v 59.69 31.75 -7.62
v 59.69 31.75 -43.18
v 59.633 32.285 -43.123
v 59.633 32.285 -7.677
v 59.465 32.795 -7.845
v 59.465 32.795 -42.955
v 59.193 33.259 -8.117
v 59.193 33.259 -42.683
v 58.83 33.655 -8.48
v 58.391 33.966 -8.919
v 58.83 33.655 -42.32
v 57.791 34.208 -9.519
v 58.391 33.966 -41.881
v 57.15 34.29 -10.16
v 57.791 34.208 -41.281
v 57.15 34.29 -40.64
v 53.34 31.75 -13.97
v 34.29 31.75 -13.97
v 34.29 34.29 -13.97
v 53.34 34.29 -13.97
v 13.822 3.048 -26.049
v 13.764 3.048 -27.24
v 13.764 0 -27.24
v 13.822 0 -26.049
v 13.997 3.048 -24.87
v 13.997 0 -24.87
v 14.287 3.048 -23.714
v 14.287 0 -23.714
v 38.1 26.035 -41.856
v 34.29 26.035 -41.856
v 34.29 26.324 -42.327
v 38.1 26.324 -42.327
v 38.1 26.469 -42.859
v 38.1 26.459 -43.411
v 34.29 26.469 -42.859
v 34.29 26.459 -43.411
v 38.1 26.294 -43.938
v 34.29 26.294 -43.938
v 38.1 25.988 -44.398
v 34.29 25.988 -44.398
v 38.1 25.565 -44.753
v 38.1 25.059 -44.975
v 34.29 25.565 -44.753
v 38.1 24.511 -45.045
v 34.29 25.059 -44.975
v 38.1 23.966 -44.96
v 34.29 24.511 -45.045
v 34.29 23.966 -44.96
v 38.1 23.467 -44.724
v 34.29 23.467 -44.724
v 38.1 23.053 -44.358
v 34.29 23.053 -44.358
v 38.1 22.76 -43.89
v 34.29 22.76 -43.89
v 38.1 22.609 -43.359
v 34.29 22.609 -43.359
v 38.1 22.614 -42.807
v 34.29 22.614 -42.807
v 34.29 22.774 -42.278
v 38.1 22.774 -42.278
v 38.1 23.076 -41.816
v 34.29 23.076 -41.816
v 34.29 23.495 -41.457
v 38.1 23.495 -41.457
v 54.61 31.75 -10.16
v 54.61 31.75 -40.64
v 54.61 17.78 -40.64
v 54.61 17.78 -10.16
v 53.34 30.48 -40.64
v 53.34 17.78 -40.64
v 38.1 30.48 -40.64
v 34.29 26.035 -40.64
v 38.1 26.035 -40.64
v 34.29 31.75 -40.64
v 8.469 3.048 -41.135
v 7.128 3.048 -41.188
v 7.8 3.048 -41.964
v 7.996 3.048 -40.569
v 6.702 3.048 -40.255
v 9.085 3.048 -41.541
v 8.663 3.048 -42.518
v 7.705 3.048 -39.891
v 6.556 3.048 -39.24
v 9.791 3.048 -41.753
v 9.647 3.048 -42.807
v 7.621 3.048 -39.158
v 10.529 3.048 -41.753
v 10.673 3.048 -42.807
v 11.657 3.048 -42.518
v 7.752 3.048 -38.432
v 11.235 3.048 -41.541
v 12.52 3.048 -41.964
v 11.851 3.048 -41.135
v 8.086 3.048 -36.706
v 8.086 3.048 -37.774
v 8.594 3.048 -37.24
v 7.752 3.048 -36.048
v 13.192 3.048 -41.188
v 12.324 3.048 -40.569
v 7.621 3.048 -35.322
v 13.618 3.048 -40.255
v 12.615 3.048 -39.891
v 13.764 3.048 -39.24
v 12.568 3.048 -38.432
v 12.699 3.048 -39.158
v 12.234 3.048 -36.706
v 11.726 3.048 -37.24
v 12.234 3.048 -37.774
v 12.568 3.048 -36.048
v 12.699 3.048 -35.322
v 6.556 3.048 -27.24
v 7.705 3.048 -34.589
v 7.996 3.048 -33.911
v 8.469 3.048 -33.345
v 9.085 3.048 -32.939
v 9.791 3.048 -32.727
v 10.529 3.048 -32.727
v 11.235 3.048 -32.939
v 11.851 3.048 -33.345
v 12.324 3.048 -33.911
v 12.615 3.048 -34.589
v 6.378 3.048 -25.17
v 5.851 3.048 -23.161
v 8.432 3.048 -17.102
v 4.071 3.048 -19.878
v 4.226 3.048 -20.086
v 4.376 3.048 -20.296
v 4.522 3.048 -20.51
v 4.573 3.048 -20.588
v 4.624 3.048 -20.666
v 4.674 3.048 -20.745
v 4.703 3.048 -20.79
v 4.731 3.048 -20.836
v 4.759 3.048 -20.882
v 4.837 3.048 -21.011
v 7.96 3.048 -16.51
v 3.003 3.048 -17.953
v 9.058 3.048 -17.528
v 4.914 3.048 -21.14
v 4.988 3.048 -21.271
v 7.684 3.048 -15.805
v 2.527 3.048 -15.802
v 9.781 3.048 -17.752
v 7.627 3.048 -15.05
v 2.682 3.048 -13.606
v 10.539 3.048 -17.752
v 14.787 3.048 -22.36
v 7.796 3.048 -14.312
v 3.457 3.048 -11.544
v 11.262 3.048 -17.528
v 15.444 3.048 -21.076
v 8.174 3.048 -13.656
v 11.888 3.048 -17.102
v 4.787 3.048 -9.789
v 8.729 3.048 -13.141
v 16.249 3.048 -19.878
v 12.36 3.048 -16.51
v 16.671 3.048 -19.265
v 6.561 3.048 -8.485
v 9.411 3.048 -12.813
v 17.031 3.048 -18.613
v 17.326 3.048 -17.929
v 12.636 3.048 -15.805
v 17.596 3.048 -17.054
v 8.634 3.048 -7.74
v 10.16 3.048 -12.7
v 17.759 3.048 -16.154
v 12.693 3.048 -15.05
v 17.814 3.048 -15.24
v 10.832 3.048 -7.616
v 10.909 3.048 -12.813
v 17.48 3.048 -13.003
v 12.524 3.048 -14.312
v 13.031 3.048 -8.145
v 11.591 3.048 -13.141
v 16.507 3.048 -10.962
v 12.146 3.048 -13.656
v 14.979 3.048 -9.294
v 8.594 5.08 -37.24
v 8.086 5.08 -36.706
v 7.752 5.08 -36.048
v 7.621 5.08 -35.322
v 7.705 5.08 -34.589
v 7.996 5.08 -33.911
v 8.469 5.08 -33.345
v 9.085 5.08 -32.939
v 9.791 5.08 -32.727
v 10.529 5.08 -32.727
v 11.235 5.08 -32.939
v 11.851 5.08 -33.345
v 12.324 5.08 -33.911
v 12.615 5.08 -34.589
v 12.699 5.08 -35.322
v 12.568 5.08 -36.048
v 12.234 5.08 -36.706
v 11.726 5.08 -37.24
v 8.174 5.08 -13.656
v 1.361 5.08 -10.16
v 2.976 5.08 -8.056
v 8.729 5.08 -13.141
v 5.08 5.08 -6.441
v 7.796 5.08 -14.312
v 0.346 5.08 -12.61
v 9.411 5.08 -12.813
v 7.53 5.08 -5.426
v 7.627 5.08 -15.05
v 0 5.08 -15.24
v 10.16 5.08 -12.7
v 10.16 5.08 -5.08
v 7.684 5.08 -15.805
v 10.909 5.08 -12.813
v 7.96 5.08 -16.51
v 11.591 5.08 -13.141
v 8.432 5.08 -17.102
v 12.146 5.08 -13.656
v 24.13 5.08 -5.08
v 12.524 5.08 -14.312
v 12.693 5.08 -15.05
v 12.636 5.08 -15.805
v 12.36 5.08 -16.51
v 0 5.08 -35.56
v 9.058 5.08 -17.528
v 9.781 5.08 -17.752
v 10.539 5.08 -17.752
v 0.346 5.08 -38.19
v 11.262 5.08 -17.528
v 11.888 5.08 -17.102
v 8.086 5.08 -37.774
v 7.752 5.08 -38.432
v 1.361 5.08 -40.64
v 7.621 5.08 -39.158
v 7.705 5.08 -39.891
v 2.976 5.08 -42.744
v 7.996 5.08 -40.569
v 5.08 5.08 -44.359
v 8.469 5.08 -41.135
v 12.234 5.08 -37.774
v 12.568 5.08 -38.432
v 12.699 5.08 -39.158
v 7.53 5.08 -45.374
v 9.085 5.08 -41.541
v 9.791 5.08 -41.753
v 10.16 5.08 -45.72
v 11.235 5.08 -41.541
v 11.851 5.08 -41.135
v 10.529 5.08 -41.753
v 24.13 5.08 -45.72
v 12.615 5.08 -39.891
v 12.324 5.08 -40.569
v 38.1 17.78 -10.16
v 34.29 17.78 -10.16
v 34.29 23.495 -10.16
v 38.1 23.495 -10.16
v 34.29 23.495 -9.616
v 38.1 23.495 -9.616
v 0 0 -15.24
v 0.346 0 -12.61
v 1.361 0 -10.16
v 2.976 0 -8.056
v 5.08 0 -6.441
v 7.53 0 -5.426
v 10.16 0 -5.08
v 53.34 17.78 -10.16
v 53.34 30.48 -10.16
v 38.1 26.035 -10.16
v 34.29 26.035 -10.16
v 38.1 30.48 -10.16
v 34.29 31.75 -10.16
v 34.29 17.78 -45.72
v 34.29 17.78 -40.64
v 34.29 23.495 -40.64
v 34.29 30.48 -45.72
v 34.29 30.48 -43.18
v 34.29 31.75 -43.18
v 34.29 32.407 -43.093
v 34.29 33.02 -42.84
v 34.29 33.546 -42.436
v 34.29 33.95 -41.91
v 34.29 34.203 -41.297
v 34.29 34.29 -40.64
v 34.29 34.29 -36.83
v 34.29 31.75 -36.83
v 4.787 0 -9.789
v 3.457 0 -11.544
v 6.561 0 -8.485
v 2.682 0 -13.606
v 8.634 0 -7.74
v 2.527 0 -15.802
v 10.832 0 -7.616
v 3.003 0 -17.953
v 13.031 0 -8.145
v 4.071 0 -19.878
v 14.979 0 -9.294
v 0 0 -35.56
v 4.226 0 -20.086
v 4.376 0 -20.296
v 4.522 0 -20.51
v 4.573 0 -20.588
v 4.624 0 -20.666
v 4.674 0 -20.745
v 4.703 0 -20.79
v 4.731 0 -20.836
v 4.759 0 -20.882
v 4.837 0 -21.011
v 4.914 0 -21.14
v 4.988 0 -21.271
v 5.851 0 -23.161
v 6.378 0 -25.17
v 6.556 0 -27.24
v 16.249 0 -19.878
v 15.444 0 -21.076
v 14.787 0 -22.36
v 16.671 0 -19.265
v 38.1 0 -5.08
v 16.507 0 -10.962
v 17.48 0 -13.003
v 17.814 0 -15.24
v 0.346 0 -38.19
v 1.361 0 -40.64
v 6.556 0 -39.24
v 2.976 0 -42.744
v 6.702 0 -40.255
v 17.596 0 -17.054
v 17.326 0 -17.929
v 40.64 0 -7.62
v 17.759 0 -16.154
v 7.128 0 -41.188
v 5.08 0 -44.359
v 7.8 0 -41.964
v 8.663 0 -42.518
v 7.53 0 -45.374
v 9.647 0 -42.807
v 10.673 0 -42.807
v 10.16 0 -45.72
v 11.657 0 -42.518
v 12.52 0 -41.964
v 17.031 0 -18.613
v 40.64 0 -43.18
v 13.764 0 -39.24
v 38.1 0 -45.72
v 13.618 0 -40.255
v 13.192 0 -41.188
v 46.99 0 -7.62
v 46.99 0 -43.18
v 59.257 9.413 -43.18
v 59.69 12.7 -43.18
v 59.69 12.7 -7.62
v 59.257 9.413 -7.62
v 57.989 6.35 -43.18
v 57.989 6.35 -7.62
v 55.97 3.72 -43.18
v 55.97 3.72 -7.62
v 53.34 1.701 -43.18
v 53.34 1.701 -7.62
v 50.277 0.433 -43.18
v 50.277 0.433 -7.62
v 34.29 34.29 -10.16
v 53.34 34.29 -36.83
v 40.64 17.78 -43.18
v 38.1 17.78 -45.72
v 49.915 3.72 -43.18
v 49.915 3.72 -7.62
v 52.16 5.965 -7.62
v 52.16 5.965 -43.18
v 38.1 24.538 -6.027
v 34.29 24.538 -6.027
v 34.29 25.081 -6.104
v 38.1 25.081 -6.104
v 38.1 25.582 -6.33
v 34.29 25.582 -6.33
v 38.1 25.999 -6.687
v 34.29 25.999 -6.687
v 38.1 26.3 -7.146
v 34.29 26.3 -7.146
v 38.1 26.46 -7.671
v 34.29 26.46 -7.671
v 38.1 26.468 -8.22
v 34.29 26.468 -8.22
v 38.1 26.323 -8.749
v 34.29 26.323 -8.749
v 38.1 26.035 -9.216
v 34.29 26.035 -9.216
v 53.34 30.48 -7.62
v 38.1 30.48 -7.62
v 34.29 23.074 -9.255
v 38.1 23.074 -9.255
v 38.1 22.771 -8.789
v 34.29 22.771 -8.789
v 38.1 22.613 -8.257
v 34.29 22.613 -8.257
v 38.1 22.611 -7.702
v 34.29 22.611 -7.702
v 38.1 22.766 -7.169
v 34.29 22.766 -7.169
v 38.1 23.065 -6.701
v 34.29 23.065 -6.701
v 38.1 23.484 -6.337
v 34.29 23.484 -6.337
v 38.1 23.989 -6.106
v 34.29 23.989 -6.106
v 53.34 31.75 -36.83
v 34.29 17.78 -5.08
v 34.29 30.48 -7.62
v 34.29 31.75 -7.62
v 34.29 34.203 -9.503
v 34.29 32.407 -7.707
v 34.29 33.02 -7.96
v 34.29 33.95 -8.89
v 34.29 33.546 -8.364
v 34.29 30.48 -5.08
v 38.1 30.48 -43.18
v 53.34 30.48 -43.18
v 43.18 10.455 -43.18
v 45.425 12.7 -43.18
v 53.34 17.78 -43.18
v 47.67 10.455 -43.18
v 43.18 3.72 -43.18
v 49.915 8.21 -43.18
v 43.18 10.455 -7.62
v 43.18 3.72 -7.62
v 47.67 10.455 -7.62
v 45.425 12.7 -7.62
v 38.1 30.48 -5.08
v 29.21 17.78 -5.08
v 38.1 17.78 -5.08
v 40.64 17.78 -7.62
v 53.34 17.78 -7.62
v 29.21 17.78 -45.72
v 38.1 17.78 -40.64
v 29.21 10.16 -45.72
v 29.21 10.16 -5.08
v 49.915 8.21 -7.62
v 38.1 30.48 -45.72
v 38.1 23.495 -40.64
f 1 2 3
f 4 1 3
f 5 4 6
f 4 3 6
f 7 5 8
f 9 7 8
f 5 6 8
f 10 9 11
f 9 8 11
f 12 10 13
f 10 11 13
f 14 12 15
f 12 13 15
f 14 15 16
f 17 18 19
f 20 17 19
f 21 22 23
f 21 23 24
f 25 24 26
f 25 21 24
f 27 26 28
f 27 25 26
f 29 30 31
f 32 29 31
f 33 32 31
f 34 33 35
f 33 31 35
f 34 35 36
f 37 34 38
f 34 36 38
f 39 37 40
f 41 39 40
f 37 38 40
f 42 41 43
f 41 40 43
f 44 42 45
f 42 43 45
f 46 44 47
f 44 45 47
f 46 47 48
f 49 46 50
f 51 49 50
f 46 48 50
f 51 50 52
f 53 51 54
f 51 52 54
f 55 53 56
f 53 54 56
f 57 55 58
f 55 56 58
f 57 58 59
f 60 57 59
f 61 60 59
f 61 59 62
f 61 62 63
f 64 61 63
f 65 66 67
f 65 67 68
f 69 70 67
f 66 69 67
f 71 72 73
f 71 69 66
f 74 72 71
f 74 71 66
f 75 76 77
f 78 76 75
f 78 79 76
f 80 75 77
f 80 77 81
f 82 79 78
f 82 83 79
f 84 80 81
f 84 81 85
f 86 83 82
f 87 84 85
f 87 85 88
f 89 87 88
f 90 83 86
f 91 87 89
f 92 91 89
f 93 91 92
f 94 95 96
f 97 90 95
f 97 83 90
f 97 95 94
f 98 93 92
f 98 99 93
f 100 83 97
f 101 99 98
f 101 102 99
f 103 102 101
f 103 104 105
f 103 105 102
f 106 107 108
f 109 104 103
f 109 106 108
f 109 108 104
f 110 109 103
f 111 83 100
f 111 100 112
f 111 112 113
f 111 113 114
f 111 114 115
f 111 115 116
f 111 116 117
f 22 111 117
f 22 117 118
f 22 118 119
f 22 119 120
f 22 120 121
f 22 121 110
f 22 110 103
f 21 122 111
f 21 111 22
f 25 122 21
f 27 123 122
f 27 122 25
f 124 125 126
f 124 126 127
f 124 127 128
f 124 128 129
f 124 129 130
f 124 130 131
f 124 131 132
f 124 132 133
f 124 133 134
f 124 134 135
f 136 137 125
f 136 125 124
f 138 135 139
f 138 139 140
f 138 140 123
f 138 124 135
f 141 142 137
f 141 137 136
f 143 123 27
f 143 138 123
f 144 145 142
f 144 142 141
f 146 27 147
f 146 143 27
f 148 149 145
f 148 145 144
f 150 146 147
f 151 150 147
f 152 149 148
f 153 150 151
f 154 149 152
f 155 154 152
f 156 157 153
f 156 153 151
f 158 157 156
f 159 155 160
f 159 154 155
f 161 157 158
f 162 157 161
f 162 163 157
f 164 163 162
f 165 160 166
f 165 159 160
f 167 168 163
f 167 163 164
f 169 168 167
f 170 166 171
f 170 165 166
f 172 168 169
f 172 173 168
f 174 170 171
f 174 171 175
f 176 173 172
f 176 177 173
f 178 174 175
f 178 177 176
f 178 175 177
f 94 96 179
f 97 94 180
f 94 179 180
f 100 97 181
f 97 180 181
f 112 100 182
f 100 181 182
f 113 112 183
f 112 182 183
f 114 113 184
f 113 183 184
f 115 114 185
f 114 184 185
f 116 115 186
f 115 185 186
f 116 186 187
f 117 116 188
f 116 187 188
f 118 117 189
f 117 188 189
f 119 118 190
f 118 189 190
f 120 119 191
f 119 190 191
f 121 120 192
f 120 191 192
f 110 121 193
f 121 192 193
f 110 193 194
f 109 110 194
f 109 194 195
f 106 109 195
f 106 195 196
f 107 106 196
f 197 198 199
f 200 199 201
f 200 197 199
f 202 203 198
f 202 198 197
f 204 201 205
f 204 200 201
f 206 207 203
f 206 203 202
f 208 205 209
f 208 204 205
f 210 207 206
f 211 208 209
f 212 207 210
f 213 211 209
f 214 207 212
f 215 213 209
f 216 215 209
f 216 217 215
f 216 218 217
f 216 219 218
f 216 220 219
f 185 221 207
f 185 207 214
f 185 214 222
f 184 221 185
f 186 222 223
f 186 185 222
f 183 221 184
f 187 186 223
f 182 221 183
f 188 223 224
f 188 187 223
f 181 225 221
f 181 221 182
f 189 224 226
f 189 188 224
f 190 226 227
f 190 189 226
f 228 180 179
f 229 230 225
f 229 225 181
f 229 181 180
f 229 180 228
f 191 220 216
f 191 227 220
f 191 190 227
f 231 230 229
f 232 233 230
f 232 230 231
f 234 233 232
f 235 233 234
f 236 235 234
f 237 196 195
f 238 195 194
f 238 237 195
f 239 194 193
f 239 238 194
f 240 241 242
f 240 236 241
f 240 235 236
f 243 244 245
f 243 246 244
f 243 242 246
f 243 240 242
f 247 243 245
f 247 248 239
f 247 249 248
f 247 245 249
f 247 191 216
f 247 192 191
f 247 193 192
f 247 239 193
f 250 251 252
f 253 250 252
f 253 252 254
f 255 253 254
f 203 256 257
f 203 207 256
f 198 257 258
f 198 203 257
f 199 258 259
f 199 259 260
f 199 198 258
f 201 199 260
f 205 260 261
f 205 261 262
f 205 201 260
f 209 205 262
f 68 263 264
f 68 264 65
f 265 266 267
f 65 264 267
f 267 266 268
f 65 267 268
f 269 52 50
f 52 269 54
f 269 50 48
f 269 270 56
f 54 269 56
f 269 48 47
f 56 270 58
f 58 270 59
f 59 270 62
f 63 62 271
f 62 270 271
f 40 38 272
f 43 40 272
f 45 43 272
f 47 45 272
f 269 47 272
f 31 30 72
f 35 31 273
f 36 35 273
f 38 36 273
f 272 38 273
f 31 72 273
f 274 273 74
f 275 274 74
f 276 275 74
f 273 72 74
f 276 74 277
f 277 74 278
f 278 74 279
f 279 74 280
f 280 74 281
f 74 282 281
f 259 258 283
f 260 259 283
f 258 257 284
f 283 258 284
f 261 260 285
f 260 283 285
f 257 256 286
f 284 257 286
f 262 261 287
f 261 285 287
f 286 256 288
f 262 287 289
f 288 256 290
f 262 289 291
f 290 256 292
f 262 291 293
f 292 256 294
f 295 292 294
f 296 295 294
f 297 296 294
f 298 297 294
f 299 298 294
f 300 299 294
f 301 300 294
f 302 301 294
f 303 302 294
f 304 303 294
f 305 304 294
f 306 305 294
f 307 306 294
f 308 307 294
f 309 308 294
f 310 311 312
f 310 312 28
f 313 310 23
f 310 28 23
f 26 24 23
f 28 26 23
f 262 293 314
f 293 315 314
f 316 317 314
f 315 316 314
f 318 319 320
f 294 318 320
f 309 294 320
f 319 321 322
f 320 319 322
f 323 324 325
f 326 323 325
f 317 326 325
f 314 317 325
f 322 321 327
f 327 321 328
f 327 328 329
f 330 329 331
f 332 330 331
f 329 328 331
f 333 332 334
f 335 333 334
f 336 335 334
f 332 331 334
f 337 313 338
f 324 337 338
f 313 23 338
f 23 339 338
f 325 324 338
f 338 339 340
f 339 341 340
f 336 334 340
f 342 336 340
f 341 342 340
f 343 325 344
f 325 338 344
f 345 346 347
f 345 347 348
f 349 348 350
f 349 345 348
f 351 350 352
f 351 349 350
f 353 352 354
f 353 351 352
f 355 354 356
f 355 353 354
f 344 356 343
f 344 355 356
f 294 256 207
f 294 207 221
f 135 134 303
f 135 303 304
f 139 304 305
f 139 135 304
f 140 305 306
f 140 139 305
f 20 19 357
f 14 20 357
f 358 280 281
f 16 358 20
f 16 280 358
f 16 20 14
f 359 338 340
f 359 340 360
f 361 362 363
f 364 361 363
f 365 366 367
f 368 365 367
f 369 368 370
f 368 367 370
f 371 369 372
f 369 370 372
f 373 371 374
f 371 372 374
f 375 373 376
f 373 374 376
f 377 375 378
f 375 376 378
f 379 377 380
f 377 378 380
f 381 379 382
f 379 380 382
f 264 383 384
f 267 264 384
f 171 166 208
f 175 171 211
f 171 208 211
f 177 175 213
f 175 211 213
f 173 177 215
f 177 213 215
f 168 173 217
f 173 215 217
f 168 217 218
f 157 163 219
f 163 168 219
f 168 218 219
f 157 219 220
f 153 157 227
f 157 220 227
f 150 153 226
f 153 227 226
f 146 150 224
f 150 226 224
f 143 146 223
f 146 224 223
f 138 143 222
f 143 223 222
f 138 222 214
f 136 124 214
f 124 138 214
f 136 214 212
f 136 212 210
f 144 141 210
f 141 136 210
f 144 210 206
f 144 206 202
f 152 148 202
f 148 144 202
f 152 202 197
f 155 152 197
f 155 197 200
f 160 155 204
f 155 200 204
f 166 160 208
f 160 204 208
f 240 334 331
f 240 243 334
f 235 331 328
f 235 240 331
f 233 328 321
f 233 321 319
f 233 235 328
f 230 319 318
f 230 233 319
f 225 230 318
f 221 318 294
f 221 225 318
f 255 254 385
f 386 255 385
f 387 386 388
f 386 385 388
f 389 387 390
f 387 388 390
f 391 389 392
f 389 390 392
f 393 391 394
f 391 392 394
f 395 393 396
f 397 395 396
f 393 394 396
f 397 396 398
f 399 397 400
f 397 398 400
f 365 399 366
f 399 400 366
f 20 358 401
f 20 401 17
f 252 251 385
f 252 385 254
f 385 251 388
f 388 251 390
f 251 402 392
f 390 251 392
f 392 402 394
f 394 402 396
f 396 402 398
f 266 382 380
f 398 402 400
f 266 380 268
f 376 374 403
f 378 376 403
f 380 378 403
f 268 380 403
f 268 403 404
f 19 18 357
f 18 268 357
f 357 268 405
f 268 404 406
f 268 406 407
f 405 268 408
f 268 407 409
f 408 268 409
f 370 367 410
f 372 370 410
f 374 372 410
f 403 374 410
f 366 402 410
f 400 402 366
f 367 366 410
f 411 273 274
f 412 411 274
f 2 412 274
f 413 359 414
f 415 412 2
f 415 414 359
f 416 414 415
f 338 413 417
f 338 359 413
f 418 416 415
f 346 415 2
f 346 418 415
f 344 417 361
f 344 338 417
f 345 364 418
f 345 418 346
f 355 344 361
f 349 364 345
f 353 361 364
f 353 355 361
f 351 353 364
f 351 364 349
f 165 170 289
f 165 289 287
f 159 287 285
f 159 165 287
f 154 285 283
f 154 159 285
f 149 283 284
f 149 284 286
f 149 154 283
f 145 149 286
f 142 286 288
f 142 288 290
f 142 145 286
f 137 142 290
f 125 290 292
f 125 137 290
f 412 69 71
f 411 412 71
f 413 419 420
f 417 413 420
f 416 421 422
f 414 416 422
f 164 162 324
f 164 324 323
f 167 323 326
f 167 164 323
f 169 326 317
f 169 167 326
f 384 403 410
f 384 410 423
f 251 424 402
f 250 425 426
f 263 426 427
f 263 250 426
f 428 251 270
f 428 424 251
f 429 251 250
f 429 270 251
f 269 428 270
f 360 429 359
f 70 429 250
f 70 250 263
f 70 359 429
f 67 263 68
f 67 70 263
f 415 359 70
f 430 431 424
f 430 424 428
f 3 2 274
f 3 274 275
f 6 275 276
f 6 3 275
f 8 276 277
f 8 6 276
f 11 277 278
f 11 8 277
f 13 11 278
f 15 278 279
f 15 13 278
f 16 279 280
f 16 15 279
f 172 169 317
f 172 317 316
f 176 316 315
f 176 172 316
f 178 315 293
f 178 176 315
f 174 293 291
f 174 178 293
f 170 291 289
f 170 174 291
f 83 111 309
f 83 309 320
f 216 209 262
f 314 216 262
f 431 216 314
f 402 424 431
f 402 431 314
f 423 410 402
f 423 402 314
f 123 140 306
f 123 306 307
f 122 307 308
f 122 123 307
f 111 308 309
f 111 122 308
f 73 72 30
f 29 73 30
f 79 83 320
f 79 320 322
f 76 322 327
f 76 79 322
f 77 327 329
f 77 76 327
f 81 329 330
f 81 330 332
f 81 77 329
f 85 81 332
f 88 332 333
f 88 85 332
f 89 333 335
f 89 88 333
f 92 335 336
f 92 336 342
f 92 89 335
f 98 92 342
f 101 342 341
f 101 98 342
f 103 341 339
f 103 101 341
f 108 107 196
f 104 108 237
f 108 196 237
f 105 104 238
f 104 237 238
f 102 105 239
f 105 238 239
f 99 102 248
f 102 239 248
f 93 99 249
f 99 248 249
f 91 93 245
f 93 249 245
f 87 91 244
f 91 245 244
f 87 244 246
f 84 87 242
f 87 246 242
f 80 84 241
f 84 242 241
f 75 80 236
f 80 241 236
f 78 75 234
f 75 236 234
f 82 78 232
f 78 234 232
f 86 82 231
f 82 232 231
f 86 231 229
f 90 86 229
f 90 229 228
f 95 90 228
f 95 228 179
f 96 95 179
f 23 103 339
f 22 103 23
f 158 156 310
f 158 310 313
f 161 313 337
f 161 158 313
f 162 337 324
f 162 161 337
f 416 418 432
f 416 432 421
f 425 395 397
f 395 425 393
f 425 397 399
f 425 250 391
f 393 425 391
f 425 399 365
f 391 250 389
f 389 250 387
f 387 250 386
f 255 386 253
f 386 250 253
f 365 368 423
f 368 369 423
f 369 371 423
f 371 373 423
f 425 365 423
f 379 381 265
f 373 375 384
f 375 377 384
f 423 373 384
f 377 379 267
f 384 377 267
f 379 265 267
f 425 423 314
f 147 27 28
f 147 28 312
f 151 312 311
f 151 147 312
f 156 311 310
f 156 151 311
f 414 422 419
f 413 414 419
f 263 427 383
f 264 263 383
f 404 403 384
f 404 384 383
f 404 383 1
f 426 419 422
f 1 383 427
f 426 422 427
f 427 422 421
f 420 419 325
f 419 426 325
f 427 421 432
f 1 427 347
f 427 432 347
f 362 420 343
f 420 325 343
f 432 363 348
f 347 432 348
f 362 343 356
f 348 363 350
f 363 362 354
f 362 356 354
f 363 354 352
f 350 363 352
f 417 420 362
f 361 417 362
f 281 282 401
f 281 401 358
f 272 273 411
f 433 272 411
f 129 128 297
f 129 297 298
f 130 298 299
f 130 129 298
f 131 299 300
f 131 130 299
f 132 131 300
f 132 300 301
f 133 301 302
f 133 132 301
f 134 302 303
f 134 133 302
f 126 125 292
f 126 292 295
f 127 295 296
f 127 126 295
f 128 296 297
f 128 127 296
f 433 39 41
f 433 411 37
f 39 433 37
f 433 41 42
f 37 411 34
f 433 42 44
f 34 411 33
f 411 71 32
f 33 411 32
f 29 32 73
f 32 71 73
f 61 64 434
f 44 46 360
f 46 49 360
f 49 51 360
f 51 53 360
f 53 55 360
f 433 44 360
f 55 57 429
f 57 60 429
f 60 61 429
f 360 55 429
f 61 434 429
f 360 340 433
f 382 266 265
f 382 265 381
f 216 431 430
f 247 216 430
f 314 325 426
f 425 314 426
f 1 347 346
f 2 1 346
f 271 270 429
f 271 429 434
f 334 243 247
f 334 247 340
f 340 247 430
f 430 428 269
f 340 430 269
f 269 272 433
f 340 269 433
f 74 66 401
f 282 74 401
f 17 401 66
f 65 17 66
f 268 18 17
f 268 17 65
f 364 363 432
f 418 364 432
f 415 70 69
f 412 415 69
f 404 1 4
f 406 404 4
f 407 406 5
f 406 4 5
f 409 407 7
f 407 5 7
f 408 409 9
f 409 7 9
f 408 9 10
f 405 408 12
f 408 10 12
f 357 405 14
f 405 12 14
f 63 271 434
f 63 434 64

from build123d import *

# Parameters (mm, degrees)
SKETCH1_W           = 59.69
SKETCH1_H           = 50.8
BOSS_EXTRUDE1_DEPTH = 5.08
SKETCH2_W           = 30.48
SKETCH2_H           = 50.8
BOSS_EXTRUDE2_DEPTH = 12.7
SKETCH3_W           = 25.4
SKETCH3_H           = 35.56
BOSS_EXTRUDE3_DEPTH = 16.51
SKETCH5_W           = 30.48
SKETCH5_H           = 13.97
CUT_EXTRUDE1_DEPTH  = 20.32
FILLET2_R           = 2.54
FILLET3_R           = 12.7
CUT_EXTRUDE4_DEPTH  = 48.514
SKETCH12_W          = 3.81
SKETCH12_H          = 12.7
BOSS_EXTRUDE5_DEPTH = 2.54
SKETCH13_W          = 3.175
SKETCH13_H          = 2.54
CUT_EXTRUDE5_DEPTH  = 4.318
SKETCH14_R          = 2.54
CUT_EXTRUDE6_DEPTH  = 14.732
CUT_EXTRUDE7_START  = -3.048
SKETCH15_R          = 2.54
CUT_EXTRUDE7_DEPTH  = 3.048
CUT_EXTRUDE8_DEPTH  = 10.16
CUT_EXTRUDE9_START  = -17.78
CUT_EXTRUDE9_DEPTH  = 17.78
CHAMFER8_SIZE       = 2.54
CHAMFER9_SIZE       = 5.08
SKETCH20_W          = 22.86
SKETCH20_H          = 2.54
CUT_EXTRUDE10_DEPTH = 19.05
FILLET4_R           = 10.16
CUT_EXTRUDE11_DEPTH = 45.212


# Read off the part's stored shape, not the designer's step: Cut-Extrude9
with BuildPart() as part:
    # Sketch1 → Boss-Extrude1 (new body)
    with BuildSketch(Plane(origin=(0, 0, 0), x_dir=(1, 0, 0), z_dir=(0, 1, 0))):
        with Locations((29.845, 25.4)):
            Rectangle(SKETCH1_W, SKETCH1_H)
    extrude(amount=BOSS_EXTRUDE1_DEPTH)

    # Sketch2 → Boss-Extrude2 (add)
    with BuildSketch(Plane(origin=(0, 5.08, 0), x_dir=(1, 0, 0), z_dir=(0, 1, 0))):
        with Locations((44.45, 25.4)):
            Rectangle(SKETCH2_W, SKETCH2_H)
    extrude(amount=BOSS_EXTRUDE2_DEPTH)

    # Sketch3 → Boss-Extrude3 (add)
    with BuildSketch(Plane(origin=(0, 17.78, 0), x_dir=(1, 0, 0), z_dir=(0, 1, 0))):
        with Locations((46.99, 25.4)):
            Rectangle(SKETCH3_W, SKETCH3_H)
    extrude(amount=BOSS_EXTRUDE3_DEPTH)

    # Sketch5 → Cut-Extrude1 (cut)
    with BuildSketch(Plane.ZY.offset(-34.29)):
        with Locations((-25.4, 24.765)):
            Rectangle(SKETCH5_W, SKETCH5_H)
    extrude(amount=-CUT_EXTRUDE1_DEPTH, mode=Mode.SUBTRACT)

    # Fillet2
    fillet2_edges = [part.edges().sort_by_distance(p)[0] for p in [
        (59.69, 34.29, -25.4),
        (46.99, 34.29, -7.62),
        (46.99, 34.29, -43.18),
    ]]
    fillet(fillet2_edges, radius=FILLET2_R)

    # Fillet3
    fillet3_edges = [part.edges().sort_by_distance(p)[0] for p in [
        (59.69, 0, -25.4),
    ]]
    fillet(fillet3_edges, radius=FILLET3_R)

    # Sketch11 → Cut-Extrude4 (cut)
    with BuildSketch(Plane.XY.offset(-7.62)):
        Polygon((45.72, 17.78), (53.34, 17.78), (53.34, 30.48), (45.72, 30.48), (38.1, 30.48), (38.1, 17.78), align=None)
    extrude(amount=-CUT_EXTRUDE4_DEPTH, mode=Mode.SUBTRACT)

    # Sketch12 → Boss-Extrude5 (add)
    with BuildSketch(Plane.XY.offset(-7.62)):
        with Locations((36.195, 24.13)):
            Rectangle(SKETCH12_W, SKETCH12_H)
    boss_extrude5 = extrude(amount=BOSS_EXTRUDE5_DEPTH)

    # Sketch13 → Cut-Extrude5 (cut)
    with BuildSketch(Plane.ZY.offset(-34.29)):
        with Locations((-8.5725, 24.765)):
            Rectangle(SKETCH13_W, SKETCH13_H)
    cut_extrude5 = extrude(amount=-CUT_EXTRUDE5_DEPTH, mode=Mode.SUBTRACT)

    # Mirror6: Boss-Extrude5, Cut-Extrude5 across plane
    add(boss_extrude5.mirror(Plane(origin=(0, 0, -25.4), x_dir=(1, 0, 0), z_dir=(0, 0, -1))))
    add(cut_extrude5.mirror(Plane(origin=(0, 0, -25.4), x_dir=(1, 0, 0), z_dir=(0, 0, -1))), mode=Mode.SUBTRACT)

    # Sketch14 → Cut-Extrude6 (cut)
    with BuildSketch(Plane(origin=(0, 5.08, 0), x_dir=(1, 0, 0), z_dir=(0, 1, 0))):
        with Locations(Location((10.16, 15.24, 0), (0, 0, 270))):
            Circle(SKETCH14_R)
        with Locations((10.16, 39.24)):
            Circle(SKETCH14_R)
        with Locations((10.16, 35.24)):
            Circle(SKETCH14_R)
    extrude(amount=-CUT_EXTRUDE6_DEPTH, mode=Mode.SUBTRACT)

    # Sketch15 → Cut-Extrude7 (cut)
    # profile 1 of 6: a face of its own
    with BuildSketch(Plane.XZ.offset(CUT_EXTRUDE7_START)):
        with BuildLine():
            ThreePointArc((9.51, -22.611397425), (13.149879796, -22.009092908), (16.046575957, -19.724219386))
            ThreePointArc((16.046575957, -19.724219386), (16.636280729, -18.820193838), (17.08820323, -17.84))
            ThreePointArc((17.08820323, -17.84), (17.441095519, -16.561229748), (17.56, -15.24))
            ThreePointArc((17.56, -15.24), (15.617563559, -10.242500625), (10.81, -7.868602575))
            ThreePointArc((10.81, -7.868602575), (10.16, -7.84), (9.51, -7.868602575))
            ThreePointArc((9.51, -7.868602575), (8.519960283, -8.024026765), (7.56, -8.31179677))
            ThreePointArc((7.56, -8.31179677), (4.927409819, -10.007409819), (3.23179677, -12.64))
            ThreePointArc((3.23179677, -12.64), (2.838717156, -16.316483868), (4.273424043, -19.724219386))
            ThreePointArc((4.273424043, -19.724219386), (6.58709424, -21.720304347), (9.51, -22.611397425))
        make_face()
        with Locations(Location((10.16, -15.24, 0), (0, 0, 90))):
            Circle(SKETCH15_R, mode=Mode.SUBTRACT)
    # profile 2 of 6: a face of its own
    with BuildSketch(Plane.XZ.offset(CUT_EXTRUDE7_START)):
        with BuildLine():
            ThreePointArc((4.0713713, -19.878137186), (4.573160427, -20.471724342), (5.132563215, -21.011359924))
            ThreePointArc((5.132563215, -21.011359924), (5.05499215, -20.879662574), (4.975804045, -20.748931147))
            ThreePointArc((4.975804045, -20.748931147), (4.93245275, -20.678870605), (4.888637021, -20.609099577))
            ThreePointArc((4.888637021, -20.609099577), (4.811656565, -20.488952481), (4.733298943, -20.369698976))
            ThreePointArc((4.733298943, -20.369698976), (4.508518631, -20.043284953), (4.273424043, -19.724219386))
            ThreePointArc((4.273424043, -19.724219386), (2.838717156, -16.316483868), (3.23179677, -12.64))
            ThreePointArc((3.23179677, -12.64), (4.927409819, -10.007409819), (7.56, -8.31179677))
            ThreePointArc((7.56, -8.31179677), (8.519960283, -8.024026765), (9.51, -7.868602575))
            ThreePointArc((9.51, -7.868602575), (10.16, -7.84), (10.81, -7.868602575))
            ThreePointArc((10.81, -7.868602575), (15.617563559, -10.242500625), (17.56, -15.24))
            ThreePointArc((17.56, -15.24), (17.441095519, -16.561229748), (17.08820323, -17.84))
            ThreePointArc((17.08820323, -17.84), (16.636280729, -18.820193838), (16.046575957, -19.724219386))
            ThreePointArc((16.046575957, -19.724219386), (15.596911767, -20.35437693), (15.187436785, -21.011359924))
            ThreePointArc((15.187436785, -21.011359924), (15.746839573, -20.471724342), (16.2486287, -19.878137186))
            ThreePointArc((16.2486287, -19.878137186), (16.858574689, -18.943081573), (17.326009125, -17.929243243))
            ThreePointArc((17.326009125, -17.929243243), (17.691014203, -16.606580067), (17.814, -15.24))
            ThreePointArc((17.814, -15.24), (15.804890741, -10.070964836), (10.832310811, -7.615584339))
            ThreePointArc((10.832310811, -7.615584339), (3.457263585, -11.544456664), (4.0713713, -19.878137186))
        make_face()
    # profile 3 of 6: a face of its own
    with BuildSketch(Plane.XZ.offset(CUT_EXTRUDE7_START)):
        with BuildLine():
            Line((6.81, -27.24), (6.81, -39.24))
            ThreePointArc((6.81, -39.24), (10.16, -42.59), (13.51, -39.24))
            Line((13.51, -39.24), (13.51, -27.24))
            ThreePointArc((13.51, -27.24), (13.644215557, -25.420308369), (14.043957423, -23.64))
            ThreePointArc((14.043957423, -23.64), (14.539499055, -22.292533204), (15.187436785, -21.011359924))
            ThreePointArc((15.187436785, -21.011359924), (10.16, -22.894), (5.132563215, -21.011359924))
            ThreePointArc((5.132563215, -21.011359924), (5.171342294, -21.078619011), (5.209699594, -21.146119525))
            ThreePointArc((5.209699594, -21.146119525), (6.403255377, -24.089748397), (6.81, -27.24))
        make_face()
        with BuildLine():
            ThreePointArc((8.594241398, -37.24), (10.16, -32.7), (11.725758602, -37.24))
            ThreePointArc((11.725758602, -37.24), (10.16, -41.78), (8.594241398, -37.24))
        make_face(mode=Mode.SUBTRACT)
    # profile 4 of 6: a face of its own
    with BuildSketch(Plane.XZ.offset(CUT_EXTRUDE7_START)):
        with BuildLine():
            ThreePointArc((13.51, -39.24), (10.16, -42.59), (6.81, -39.24))
            Line((6.81, -39.24), (6.81, -27.24))
            ThreePointArc((6.81, -27.24), (6.403255377, -24.089748397), (5.209699594, -21.146119525))
            ThreePointArc((5.209699594, -21.146119525), (5.171342294, -21.078619011), (5.132563215, -21.011359924))
            ThreePointArc((5.132563215, -21.011359924), (4.573160427, -20.471724342), (4.0713713, -19.878137186))
            ThreePointArc((4.0713713, -19.878137186), (4.30165132, -20.19066852), (4.521828292, -20.510397817))
            ThreePointArc((4.521828292, -20.510397817), (4.598581207, -20.627209095), (4.673985158, -20.744895666))
            ThreePointArc((4.673985158, -20.744895666), (4.716903572, -20.813237833), (4.759367064, -20.881863585))
            ThreePointArc((4.759367064, -20.881863585), (4.875727352, -21.075326298), (4.988472599, -21.270917829))
            ThreePointArc((4.988472599, -21.270917829), (6.157585215, -24.154263292), (6.556, -27.24))
            Line((6.556, -27.24), (6.556, -39.24))
            ThreePointArc((6.556, -39.24), (10.16, -42.844), (13.764, -39.24))
            Line((13.764, -39.24), (13.764, -27.24))
            ThreePointArc((13.764, -27.24), (13.895466918, -25.457574349), (14.287022358, -23.71372542))
            ThreePointArc((14.287022358, -23.71372542), (15.096450182, -21.708286085), (16.2486287, -19.878137186))
            ThreePointArc((16.2486287, -19.878137186), (15.746839573, -20.471724342), (15.187436785, -21.011359924))
            ThreePointArc((15.187436785, -21.011359924), (14.539499055, -22.292533204), (14.043957423, -23.64))
            ThreePointArc((14.043957423, -23.64), (13.644215557, -25.420308369), (13.51, -27.24))
            Line((13.51, -27.24), (13.51, -39.24))
        make_face()
    # profile 5 of 6: a face of its own
    with BuildSketch(Plane.XZ.offset(CUT_EXTRUDE7_START)):
        with BuildLine():
            ThreePointArc((4.0713713, -19.878137186), (4.573160427, -20.471724342), (5.132563215, -21.011359924))
            ThreePointArc((5.132563215, -21.011359924), (5.05499215, -20.879662574), (4.975804045, -20.748931147))
            ThreePointArc((4.975804045, -20.748931147), (4.93245275, -20.678870605), (4.888637021, -20.609099577))
            ThreePointArc((4.888637021, -20.609099577), (4.811656565, -20.488952481), (4.733298943, -20.369698976))
            ThreePointArc((4.733298943, -20.369698976), (4.508518631, -20.043284953), (4.273424043, -19.724219386))
            ThreePointArc((4.273424043, -19.724219386), (2.838717156, -16.316483868), (3.23179677, -12.64))
            ThreePointArc((3.23179677, -12.64), (4.927409819, -10.007409819), (7.56, -8.31179677))
            ThreePointArc((7.56, -8.31179677), (8.519960283, -8.024026765), (9.51, -7.868602575))
            ThreePointArc((9.51, -7.868602575), (10.16, -7.84), (10.81, -7.868602575))
            ThreePointArc((10.81, -7.868602575), (15.617563559, -10.242500625), (17.56, -15.24))
            ThreePointArc((17.56, -15.24), (17.441095519, -16.561229748), (17.08820323, -17.84))
            ThreePointArc((17.08820323, -17.84), (16.636280729, -18.820193838), (16.046575957, -19.724219386))
            ThreePointArc((16.046575957, -19.724219386), (15.596911767, -20.35437693), (15.187436785, -21.011359924))
            ThreePointArc((15.187436785, -21.011359924), (15.746839573, -20.471724342), (16.2486287, -19.878137186))
            ThreePointArc((16.2486287, -19.878137186), (16.858574689, -18.943081573), (17.326009125, -17.929243243))
            ThreePointArc((17.326009125, -17.929243243), (17.691014203, -16.606580067), (17.814, -15.24))
            ThreePointArc((17.814, -15.24), (15.804890741, -10.070964836), (10.832310811, -7.615584339))
            ThreePointArc((10.832310811, -7.615584339), (3.457263585, -11.544456664), (4.0713713, -19.878137186))
        make_face()
    # profile 6 of 6: a face of its own
    with BuildSketch(Plane.XZ.offset(CUT_EXTRUDE7_START)):
        with BuildLine():
            ThreePointArc((4.975804045, -20.748931147), (5.05499215, -20.879662574), (5.132563215, -21.011359924))
            ThreePointArc((5.132563215, -21.011359924), (10.16, -22.894), (15.187436785, -21.011359924))
            ThreePointArc((15.187436785, -21.011359924), (15.596911767, -20.35437693), (16.046575957, -19.724219386))
            ThreePointArc((16.046575957, -19.724219386), (13.149879796, -22.009092908), (9.51, -22.611397425))
            ThreePointArc((9.51, -22.611397425), (6.58709424, -21.720304347), (4.273424043, -19.724219386))
            ThreePointArc((4.273424043, -19.724219386), (4.508518631, -20.043284953), (4.733298943, -20.369698976))
            ThreePointArc((4.733298943, -20.369698976), (4.811656565, -20.488952481), (4.888637021, -20.609099577))
            ThreePointArc((4.888637021, -20.609099577), (4.93245275, -20.678870605), (4.975804045, -20.748931147))
        make_face()
    extrude(amount=CUT_EXTRUDE7_DEPTH, mode=Mode.SUBTRACT)

    # Sketch16 → Cut-Extrude8 (cut)
    with BuildSketch(Plane.ZY.offset(-34.29)):
        with BuildLine():
            Line((-43.815, 26.035), (-41.856211186, 26.035))
            ThreePointArc((-41.856211186, 26.035), (-45.021919195, 24.23561484), (-41.456672525, 23.495))
            Line((-41.456672525, 23.495), (-43.815, 23.495))
            Line((-43.815, 23.495), (-43.815, 26.035))
        make_face()
        with BuildLine():
            ThreePointArc((-41.153556271, 24.538), (-41.337956779, 25.364851397), (-41.856211186, 26.035))
            Line((-41.856211186, 26.035), (-43.815, 26.035))
            Line((-43.815, 26.035), (-43.815, 23.495))
            Line((-43.815, 23.495), (-41.456672525, 23.495))
            ThreePointArc((-41.456672525, 23.495), (-41.230871202, 23.994923471), (-41.153556271, 24.538))
        make_face()
        with BuildLine():
            Line((-6.985, 26.035), (-9.216271419, 26.035))
            ThreePointArc((-9.216271419, 26.035), (-9.895289259, 24.84038516), (-9.615810079, 23.495))
            Line((-9.615810079, 23.495), (-6.985, 23.495))
            Line((-6.985, 23.495), (-6.985, 26.035))
        make_face()
        with BuildLine():
            ThreePointArc((-6.026926334, 24.538), (-7.146074937, 26.299599491), (-9.216271419, 26.035))
            Line((-9.216271419, 26.035), (-6.985, 26.035))
            Line((-6.985, 26.035), (-6.985, 23.495))
            Line((-6.985, 23.495), (-9.615810079, 23.495))
            ThreePointArc((-9.615810079, 23.495), (-7.429849805, 22.669314932), (-6.026926334, 24.538))
        make_face()
    extrude(amount=-CUT_EXTRUDE8_DEPTH, mode=Mode.SUBTRACT)

    # Cut-Extrude9 outline → Cut-Extrude9 (cut)
    with BuildSketch(Plane(origin=(0, 17.78, 0), x_dir=(1, 0, 0), z_dir=(0, 1, 0)).offset(CUT_EXTRUDE9_START)):
        Polygon((38.1, 45.72), (38.1, 43.18), (59.69, 43.18), (59.69, 50.8), (0, 50.8), (0, 45.72), align=None)
        Polygon((0, 0), (59.69, 0), (59.69, 7.62), (38.1, 7.62), (38.1, 5.08), (0, 5.08), align=None)
    extrude(amount=CUT_EXTRUDE9_DEPTH, mode=Mode.SUBTRACT)

    # Chamfer8
    chamfer8_edges = [part.edges().sort_by_distance(p)[0] for p in [
        (38.1, 8.89, -43.18),
        (38.1, 8.89, -7.62),
    ]]
    chamfer(chamfer8_edges, length=CHAMFER8_SIZE - 0.0001)  # a hair under: the kernel refuses the full size

    # Chamfer9
    chamfer9_edges = [part.edges().sort_by_distance(p)[0] for p in [
        (29.21, 5.08, -25.4),
    ]]
    chamfer(chamfer9_edges, length=CHAMFER9_SIZE)

    # Sketch20 → Cut-Extrude10 (cut)
    with BuildSketch(Plane.ZY.offset(-34.29)):
        with Locations((-25.4, 33.02)):
            Rectangle(SKETCH20_W, SKETCH20_H)
    extrude(amount=-CUT_EXTRUDE10_DEPTH, mode=Mode.SUBTRACT)

    # Fillet4
    fillet4_edges = [part.edges().sort_by_distance(p)[0] for p in [
        (0, 2.54, -45.72),
        (0, 2.54, -5.08),
    ]]
    fillet(fillet4_edges, radius=FILLET4_R)

    # Sketch21 → Cut-Extrude11 (cut)
    with BuildSketch(Plane.XY.offset(-7.62)):
        Polygon((43.18, 10.45493597), (43.18, 3.719743879), (49.915192091, 3.719743879), align=None)
        Polygon((45.42506403, 12.7), (43.18, 10.45493597), (47.670128061, 10.45493597), align=None)
        Polygon((47.670128061, 10.45493597), (43.18, 10.45493597), (49.915192091, 3.719743879), (49.915192091, 8.209871939), align=None)
        Polygon((49.915192091, 8.209871939), (49.915192091, 3.719743879), (52.160256121, 5.964807909), align=None)
    extrude(amount=-CUT_EXTRUDE11_DEPTH, mode=Mode.SUBTRACT)


solid = part.part
